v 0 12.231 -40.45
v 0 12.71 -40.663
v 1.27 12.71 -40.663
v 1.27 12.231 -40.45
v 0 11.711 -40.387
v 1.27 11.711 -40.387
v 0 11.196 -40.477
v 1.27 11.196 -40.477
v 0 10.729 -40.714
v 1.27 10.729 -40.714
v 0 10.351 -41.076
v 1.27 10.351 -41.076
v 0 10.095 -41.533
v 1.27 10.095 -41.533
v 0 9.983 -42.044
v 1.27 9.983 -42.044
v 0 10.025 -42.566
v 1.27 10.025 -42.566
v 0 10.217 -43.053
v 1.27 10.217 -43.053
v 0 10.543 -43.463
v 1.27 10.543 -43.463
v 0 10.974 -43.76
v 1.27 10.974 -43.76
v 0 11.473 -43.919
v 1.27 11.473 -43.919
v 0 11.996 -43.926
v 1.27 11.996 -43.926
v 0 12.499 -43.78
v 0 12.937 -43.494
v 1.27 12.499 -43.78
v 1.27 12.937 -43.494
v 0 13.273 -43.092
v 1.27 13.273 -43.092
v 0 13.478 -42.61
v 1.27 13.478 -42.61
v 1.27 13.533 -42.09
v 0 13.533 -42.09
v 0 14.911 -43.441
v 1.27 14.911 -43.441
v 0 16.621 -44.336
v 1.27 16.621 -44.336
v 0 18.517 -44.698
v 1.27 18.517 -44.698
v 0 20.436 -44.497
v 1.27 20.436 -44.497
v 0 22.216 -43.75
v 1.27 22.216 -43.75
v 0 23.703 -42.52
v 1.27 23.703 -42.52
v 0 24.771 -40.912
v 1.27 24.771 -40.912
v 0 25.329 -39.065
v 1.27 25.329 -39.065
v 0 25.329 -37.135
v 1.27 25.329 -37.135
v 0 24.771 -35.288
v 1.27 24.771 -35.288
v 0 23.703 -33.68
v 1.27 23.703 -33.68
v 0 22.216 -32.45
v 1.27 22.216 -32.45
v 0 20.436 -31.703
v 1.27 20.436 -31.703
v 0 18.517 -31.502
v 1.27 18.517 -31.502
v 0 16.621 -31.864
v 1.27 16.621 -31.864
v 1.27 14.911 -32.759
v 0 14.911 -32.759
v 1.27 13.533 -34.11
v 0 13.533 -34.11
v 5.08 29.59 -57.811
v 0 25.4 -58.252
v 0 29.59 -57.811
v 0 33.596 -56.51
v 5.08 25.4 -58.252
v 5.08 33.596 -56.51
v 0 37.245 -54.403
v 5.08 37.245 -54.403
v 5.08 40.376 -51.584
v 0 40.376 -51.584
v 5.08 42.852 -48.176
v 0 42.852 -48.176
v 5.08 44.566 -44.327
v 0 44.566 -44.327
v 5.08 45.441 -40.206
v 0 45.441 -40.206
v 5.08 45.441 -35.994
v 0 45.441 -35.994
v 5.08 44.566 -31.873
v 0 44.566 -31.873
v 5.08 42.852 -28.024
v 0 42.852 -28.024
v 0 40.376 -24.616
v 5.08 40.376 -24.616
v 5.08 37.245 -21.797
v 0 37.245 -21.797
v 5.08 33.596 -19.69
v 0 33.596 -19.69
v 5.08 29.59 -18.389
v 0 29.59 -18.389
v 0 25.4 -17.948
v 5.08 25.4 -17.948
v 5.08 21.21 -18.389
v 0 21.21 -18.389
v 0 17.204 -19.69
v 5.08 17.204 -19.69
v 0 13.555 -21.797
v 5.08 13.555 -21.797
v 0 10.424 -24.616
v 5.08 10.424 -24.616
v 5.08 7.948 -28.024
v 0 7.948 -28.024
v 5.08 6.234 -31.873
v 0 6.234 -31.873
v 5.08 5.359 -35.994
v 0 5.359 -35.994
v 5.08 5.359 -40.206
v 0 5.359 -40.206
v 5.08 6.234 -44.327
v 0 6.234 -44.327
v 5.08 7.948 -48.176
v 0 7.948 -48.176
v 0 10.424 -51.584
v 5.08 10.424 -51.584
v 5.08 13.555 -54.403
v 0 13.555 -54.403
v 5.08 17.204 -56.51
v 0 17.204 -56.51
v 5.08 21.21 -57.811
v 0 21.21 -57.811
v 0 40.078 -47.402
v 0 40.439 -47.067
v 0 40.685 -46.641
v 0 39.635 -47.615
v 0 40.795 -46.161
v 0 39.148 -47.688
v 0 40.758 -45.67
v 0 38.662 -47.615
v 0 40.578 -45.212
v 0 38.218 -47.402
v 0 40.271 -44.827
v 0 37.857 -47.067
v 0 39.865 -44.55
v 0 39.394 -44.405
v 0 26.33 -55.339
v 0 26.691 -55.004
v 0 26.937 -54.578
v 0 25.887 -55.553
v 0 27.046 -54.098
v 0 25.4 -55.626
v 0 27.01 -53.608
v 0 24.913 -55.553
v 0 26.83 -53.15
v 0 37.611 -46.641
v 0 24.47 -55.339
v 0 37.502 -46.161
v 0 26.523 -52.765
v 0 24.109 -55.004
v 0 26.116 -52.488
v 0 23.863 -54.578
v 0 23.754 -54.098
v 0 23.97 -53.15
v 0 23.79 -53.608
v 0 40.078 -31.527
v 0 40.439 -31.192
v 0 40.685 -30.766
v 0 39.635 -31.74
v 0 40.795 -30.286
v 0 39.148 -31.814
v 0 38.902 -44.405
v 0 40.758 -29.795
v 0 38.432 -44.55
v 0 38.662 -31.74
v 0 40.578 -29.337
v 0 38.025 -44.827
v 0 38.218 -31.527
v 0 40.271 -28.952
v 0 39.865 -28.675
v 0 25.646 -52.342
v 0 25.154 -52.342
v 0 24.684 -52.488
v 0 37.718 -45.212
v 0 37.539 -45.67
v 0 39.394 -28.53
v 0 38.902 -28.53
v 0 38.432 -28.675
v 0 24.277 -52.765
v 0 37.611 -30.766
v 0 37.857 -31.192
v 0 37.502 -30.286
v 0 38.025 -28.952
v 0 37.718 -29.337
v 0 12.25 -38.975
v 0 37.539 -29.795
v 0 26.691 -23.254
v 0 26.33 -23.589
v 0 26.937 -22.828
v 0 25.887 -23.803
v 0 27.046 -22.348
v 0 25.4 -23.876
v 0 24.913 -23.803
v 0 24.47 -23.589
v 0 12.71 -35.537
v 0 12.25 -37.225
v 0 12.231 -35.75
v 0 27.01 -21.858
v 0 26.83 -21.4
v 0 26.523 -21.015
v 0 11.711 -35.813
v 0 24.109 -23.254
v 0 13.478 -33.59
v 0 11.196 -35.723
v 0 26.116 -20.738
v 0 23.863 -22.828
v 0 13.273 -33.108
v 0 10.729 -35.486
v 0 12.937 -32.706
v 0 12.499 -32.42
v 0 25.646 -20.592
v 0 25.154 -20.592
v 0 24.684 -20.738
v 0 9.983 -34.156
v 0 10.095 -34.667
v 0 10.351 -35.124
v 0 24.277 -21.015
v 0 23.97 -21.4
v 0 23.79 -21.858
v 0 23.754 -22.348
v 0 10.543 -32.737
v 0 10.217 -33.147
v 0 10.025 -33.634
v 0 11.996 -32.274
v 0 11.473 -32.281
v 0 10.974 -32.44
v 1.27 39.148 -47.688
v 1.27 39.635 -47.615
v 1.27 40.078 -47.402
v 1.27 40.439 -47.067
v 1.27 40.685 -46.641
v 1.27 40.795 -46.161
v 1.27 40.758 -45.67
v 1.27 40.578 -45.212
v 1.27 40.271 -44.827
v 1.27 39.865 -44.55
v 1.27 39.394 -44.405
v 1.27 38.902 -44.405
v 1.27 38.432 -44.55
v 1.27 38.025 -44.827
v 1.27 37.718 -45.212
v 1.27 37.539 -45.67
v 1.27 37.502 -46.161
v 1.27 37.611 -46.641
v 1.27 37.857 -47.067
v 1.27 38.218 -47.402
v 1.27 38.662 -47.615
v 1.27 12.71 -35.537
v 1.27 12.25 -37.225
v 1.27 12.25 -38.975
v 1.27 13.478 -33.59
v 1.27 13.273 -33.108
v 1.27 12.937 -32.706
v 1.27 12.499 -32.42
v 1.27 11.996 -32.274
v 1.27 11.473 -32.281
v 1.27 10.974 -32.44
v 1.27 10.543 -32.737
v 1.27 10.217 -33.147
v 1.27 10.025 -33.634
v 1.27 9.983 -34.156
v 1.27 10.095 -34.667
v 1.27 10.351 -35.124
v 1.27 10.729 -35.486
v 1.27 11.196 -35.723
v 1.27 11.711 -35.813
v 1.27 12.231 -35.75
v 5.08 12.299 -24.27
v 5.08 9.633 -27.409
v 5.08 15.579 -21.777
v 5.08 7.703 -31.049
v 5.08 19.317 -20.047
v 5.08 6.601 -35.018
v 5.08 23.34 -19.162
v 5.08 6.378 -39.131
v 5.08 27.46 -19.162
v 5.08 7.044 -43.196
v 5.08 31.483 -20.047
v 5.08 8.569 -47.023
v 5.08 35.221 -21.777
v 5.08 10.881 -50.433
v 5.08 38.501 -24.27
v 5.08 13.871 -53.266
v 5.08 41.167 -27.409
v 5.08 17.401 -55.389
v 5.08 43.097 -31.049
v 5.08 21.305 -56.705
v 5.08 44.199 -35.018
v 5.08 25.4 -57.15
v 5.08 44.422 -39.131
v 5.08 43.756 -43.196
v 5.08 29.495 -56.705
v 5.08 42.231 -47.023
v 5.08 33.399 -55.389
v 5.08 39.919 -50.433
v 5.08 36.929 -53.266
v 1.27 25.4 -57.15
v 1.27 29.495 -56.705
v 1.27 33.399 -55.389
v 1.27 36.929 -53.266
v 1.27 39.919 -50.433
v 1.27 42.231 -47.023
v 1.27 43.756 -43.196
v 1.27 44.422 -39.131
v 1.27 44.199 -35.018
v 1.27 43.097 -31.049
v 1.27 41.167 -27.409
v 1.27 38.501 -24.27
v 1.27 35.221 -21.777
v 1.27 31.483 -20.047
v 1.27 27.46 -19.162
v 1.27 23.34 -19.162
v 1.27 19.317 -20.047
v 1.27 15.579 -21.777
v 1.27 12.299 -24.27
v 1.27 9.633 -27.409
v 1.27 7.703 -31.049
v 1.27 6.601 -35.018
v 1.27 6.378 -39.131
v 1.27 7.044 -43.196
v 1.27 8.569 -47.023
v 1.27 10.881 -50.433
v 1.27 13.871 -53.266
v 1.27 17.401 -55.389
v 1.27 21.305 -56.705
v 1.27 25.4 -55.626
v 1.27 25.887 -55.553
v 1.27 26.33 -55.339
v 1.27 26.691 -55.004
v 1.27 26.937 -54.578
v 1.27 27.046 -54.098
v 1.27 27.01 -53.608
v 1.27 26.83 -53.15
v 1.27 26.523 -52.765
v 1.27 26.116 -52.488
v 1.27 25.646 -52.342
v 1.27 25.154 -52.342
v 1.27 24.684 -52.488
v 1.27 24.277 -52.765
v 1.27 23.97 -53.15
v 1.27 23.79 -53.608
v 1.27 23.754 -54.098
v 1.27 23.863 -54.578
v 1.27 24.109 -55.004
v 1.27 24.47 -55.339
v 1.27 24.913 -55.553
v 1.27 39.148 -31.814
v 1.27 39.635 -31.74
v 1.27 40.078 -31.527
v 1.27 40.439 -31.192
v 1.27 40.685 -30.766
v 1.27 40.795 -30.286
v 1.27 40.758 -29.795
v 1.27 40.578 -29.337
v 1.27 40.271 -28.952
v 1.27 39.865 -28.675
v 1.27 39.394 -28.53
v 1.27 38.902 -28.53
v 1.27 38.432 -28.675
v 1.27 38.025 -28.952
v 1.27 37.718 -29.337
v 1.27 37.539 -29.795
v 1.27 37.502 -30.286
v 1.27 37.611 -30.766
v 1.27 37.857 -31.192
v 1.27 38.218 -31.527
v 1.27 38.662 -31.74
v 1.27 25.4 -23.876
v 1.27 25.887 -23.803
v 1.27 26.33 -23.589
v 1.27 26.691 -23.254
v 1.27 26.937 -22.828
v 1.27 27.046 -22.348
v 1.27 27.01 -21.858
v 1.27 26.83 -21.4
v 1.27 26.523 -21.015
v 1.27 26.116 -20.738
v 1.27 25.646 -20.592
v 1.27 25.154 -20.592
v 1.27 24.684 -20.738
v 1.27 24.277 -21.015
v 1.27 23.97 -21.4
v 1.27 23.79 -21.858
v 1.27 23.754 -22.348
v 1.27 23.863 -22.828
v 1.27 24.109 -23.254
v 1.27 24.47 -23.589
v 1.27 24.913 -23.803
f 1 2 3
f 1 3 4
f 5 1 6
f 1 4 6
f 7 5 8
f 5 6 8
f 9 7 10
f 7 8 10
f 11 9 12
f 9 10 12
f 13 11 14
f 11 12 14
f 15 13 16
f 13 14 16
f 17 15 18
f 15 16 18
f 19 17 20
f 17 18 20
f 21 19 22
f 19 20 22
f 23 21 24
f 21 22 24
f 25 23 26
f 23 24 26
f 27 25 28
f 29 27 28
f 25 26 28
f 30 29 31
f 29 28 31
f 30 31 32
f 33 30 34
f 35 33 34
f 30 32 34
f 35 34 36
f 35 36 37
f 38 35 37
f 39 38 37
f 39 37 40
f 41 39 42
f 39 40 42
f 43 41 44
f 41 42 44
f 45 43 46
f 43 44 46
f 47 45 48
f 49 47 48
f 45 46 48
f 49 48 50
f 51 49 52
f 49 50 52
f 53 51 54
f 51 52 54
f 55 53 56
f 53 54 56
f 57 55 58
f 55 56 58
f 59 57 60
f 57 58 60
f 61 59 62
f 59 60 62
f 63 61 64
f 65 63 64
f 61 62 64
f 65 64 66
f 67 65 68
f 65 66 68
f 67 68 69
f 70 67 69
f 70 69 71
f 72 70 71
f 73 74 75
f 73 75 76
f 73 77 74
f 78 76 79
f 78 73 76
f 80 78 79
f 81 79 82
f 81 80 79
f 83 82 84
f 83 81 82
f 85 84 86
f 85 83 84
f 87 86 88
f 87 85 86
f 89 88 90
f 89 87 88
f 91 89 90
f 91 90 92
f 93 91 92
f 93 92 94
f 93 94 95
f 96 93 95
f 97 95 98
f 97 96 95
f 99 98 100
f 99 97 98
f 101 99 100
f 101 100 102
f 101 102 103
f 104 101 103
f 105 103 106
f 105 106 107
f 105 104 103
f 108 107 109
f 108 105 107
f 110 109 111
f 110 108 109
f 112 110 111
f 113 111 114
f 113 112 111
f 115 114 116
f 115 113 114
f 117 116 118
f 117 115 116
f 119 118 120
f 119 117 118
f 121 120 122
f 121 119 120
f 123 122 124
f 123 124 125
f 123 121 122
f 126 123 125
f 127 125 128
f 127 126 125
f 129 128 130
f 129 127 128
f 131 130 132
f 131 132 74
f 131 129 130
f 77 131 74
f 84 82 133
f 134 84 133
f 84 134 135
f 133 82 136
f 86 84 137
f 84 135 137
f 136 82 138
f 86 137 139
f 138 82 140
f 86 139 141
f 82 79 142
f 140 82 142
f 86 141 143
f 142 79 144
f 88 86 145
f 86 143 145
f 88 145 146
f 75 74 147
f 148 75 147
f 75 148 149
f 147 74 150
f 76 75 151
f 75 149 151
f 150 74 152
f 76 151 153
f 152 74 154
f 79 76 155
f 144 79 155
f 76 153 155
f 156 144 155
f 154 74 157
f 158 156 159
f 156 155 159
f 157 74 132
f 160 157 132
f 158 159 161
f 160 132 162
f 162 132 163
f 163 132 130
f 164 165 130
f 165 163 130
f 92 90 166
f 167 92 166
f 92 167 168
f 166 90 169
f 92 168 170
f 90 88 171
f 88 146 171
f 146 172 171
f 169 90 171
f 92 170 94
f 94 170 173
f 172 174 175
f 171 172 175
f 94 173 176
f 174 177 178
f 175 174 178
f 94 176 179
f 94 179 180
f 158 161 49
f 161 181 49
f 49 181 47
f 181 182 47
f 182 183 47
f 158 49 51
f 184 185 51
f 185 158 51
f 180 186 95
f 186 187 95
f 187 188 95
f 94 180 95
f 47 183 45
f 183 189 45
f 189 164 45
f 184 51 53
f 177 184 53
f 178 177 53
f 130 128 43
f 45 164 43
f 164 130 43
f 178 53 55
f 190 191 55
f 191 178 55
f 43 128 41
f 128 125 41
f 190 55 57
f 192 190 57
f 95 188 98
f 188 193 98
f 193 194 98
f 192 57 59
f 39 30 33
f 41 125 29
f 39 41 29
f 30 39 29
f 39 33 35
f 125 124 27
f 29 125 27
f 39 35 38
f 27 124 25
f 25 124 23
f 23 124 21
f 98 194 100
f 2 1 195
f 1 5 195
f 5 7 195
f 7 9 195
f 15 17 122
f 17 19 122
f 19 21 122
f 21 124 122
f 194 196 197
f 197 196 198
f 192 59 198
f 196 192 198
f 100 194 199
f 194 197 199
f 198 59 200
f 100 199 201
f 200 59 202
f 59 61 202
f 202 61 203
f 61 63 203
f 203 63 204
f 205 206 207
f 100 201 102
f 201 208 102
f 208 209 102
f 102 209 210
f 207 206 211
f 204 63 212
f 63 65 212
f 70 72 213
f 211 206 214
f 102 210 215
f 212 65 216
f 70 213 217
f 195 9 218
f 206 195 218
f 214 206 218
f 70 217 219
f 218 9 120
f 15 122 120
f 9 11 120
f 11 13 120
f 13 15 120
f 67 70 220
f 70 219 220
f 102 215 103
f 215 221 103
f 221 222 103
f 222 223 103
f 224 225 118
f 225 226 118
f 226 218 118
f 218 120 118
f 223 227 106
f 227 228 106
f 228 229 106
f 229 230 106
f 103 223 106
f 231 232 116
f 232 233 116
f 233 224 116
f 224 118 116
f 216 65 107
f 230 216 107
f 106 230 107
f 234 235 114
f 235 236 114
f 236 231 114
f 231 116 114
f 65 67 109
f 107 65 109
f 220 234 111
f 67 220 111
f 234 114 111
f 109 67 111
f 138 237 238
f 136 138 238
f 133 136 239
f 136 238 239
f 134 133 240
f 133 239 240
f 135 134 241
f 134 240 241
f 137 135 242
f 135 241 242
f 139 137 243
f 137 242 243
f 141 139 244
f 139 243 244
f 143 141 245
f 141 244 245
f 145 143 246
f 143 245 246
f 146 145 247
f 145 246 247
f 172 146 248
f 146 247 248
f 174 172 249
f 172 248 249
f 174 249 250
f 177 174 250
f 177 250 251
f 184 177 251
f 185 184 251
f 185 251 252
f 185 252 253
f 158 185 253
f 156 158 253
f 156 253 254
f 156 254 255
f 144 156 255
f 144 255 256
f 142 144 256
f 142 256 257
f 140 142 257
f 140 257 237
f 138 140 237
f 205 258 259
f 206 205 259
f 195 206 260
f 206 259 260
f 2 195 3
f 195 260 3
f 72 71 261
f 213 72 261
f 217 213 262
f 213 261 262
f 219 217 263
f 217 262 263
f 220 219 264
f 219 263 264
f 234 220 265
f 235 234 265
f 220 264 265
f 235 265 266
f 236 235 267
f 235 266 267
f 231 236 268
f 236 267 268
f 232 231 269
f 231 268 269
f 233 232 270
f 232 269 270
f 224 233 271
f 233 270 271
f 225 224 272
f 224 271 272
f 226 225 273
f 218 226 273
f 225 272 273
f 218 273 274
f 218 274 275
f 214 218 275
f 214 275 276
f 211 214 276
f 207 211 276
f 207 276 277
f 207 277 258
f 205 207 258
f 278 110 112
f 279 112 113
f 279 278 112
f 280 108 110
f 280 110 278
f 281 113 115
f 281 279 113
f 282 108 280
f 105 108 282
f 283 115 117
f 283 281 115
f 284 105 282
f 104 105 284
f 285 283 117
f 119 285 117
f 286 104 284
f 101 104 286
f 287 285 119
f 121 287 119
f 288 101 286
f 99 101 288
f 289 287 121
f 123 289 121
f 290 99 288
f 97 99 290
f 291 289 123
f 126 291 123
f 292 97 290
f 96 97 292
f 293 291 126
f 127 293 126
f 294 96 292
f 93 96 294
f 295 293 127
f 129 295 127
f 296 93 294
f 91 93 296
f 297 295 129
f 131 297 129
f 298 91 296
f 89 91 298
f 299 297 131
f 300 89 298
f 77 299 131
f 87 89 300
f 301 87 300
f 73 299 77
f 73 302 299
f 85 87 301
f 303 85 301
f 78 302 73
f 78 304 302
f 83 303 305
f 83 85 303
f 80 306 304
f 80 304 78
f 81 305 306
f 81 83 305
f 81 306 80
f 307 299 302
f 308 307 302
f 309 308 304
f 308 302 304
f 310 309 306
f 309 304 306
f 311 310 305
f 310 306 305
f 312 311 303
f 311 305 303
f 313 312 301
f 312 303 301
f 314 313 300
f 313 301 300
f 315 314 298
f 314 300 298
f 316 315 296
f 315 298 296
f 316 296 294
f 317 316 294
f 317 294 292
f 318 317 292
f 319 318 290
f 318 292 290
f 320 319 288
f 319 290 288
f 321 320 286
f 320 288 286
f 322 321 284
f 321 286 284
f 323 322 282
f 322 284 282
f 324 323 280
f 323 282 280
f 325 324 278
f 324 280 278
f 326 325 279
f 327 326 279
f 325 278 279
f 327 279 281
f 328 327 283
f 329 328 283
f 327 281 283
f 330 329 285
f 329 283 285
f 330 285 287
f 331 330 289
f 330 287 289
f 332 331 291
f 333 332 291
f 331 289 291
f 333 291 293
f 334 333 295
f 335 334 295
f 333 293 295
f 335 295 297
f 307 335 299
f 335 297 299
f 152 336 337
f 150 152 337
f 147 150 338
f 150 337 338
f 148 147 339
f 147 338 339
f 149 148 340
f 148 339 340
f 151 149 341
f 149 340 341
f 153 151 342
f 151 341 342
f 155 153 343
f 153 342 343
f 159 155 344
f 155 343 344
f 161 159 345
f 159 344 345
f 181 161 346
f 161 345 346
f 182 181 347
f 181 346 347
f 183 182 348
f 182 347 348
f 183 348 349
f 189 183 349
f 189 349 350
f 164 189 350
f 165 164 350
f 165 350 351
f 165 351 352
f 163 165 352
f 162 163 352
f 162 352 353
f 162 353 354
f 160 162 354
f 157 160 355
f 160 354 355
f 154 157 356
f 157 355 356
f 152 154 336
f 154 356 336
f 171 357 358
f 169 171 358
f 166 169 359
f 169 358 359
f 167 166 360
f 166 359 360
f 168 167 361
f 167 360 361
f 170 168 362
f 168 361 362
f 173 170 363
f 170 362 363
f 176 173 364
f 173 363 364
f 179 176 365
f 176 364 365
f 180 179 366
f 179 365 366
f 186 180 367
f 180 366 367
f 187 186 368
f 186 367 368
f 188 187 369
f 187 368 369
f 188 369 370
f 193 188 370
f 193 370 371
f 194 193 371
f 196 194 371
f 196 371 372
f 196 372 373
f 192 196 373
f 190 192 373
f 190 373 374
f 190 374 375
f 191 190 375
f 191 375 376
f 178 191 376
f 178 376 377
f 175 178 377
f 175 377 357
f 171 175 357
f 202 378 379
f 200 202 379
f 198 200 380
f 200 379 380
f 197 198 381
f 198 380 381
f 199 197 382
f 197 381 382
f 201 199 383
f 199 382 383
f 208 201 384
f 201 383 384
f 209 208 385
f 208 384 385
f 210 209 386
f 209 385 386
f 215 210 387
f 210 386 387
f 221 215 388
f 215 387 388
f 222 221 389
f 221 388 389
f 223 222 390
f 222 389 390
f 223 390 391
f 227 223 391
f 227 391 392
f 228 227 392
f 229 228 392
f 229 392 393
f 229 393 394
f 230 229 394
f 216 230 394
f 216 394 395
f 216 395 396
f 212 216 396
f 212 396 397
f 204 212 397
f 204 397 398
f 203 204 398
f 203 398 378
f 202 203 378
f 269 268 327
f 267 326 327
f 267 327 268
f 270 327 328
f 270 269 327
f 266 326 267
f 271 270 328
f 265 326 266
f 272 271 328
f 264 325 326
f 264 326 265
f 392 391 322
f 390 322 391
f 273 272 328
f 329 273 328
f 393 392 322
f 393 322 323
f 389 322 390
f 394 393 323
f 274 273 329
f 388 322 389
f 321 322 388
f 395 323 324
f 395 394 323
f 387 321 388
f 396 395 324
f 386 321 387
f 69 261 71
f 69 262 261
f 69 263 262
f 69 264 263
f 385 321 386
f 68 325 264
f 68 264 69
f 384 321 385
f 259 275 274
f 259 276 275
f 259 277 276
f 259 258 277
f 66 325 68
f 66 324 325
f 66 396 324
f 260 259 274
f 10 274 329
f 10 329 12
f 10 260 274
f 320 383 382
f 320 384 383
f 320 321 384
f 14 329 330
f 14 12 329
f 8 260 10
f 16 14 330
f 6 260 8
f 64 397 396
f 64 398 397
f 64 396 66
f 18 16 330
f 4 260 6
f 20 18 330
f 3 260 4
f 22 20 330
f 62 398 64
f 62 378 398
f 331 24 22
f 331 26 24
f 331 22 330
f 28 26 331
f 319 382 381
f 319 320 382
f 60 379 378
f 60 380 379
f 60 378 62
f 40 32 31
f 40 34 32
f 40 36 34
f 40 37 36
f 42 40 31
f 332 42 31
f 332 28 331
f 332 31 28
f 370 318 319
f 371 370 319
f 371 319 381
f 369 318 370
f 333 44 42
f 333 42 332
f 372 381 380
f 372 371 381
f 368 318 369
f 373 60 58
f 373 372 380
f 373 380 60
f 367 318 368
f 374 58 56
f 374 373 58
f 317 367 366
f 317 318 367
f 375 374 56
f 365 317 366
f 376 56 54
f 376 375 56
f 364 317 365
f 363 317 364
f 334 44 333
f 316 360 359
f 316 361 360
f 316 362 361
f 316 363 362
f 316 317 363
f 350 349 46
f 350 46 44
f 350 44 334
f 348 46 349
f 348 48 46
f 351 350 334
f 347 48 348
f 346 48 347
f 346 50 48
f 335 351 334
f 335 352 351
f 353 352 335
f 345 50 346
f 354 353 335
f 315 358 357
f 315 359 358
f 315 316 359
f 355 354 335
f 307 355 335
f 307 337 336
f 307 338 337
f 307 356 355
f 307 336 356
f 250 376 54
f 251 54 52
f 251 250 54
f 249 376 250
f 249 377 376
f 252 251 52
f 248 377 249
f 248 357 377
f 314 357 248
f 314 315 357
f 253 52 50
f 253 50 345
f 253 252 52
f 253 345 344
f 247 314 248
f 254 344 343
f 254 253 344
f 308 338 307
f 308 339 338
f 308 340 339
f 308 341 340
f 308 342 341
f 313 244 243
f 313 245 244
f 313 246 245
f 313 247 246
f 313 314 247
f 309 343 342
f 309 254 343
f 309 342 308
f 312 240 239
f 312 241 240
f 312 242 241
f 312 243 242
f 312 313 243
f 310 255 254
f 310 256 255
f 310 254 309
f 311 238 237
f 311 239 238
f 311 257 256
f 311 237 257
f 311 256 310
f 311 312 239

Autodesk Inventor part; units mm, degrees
ref_plane "YZ Plane" through (0, 0, 0) normal (1, 0, 0) x (0, 1, 0)
ref_plane "XZ Plane" through (0, 0, 0) normal (0, 1, 0) x (-1, 0, 0)
ref_plane "XY Plane" through (0, 0, 0) normal (0, 0, 1) x (1, 0, 0)
sketch "Sketch1" plane through (0, 0, 0) normal (0, 1, 0) x (-1, 0, 0)
  line L0 (0, 0) -> (-20.32, 0)
  line L1 (-20.32, 0) -> (-20.32, -76.2)
  line L2 (-20.32, -76.2) -> (0, -76.2)
  line L3 (0, -76.2) -> (0, 0)
  dimension "d0" = 20.32
  dimension "d1" = 76.2
extrude "Extrusion1" add sketch "Sketch1" along normal blind 7.62
sketch "Sketch2" plane through (0, 7.62, 0) normal (0, 1, 0) x (1, 0, 0)
  line L0 (0, 0) -> (0, 12.7)
  line L1 (0, 12.7) -> (20.32, 12.7)
  line L2 (20.32, 12.7) -> (20.32, 63.5)
  line L3 (20.32, 63.5) -> (0, 63.5)
  line L4 (0, 63.5) -> (0, 12.7)
  dimension "d4" = 12.7
  dimension "d5" = 20.32
  dimension "d6" = 50.8
extrude "Extrusion2" add sketch "Sketch2" along normal blind 43.18
sketch "Sketch3" plane through (20.32, 0, 0) normal (1, 0, 0) x (0, 0, -1)
  line L0 (12.7, 50.8) -> (63.5, 50.8) projected
  line L1 (38.1, 50.8) -> (38.1, 25.4)
  circle A0 centre (38.1, 25.4) radius 19.05
  point P0 (0, 0)
  dimension "d9" = 25.4
  dimension "d10" = 38.1
extrude "Extrusion3" cut sketch "Sketch3" against normal blind 15.24
fillet "Fillet1" radius 25.4 2 edges at (10.16, 50.8, -63.5) (10.16, 50.8, -12.7)
sketch "Sketch6" plane through (0, 7.62, 0) normal (0, 1, 0) x (1, 0, 0)
  line L0 (0, 0) -> (20.32, 0) projected
  line L1 (10.16, 0) -> (10.16, 6.35)
  line L2 (20.32, 76.2) -> (0, 76.2) projected
  line L3 (10.16, 76.2) -> (10.16, 69.85)
  dimension "d20" = 6.35
  dimension "d21" = 6.35
fillet "Fillet2" radius 25.4 2 edges at (10.16, 7.62, -63.5) (10.16, 7.62, -12.7)
hole "Hole1" at (10.16, 7.62, -6.35) at (10.16, 7.62, -69.85) direction (0, -1, 0) diameter 5.08 end through all counterbore diameter 10.16 counterbore depth 3.81
sketch "Sketch7" plane through (10.16, 7.62, -6.35) normal (0, -1, 0) x (1, 0, 0)
  circle A0 centre (0, 0) radius 5.08
  circle A1 centre (0, -63.5) radius 2.54 projected
  line L0 (-2.54, -63.5) -> (0, -63.5)
  circle A2 centre (0, -63.5) radius 5.08
  point P0 (-10.16, 6.35)
  dimension "d30" = 10.16
  dimension "d31" = 10.16
extrude "Extrusion5" cut sketch "Sketch7" against normal blind 15.24 contours A0 | A1 | A2
sketch "Sketch9" plane through (5.08, 25.4, -38.1) normal (1, 0, 0) x (0, 0, -1)
  line L0 (0, 0) -> (0, -6.604)
  circle A0 centre (0, -6.604) radius 6.604
  line L1 (0, -6.604) -> (-3.302, -12.3232)
  line L2 (0, -6.604) -> (6.604, -6.604) construction
  line L3 (0, -6.604) -> (3.302, -12.3232)
  line L4 (0, -6.604) -> (6.604, -6.604) construction
  line L5 (-3.302, -12.3232) -> (-4.064, -13.6431)
  line L6 (3.302, -12.3232) -> (4.064, -13.6431)
  line L7 (3.302, -12.3232) -> (4.826, -12.3232) construction
  circle A1 centre (-4.064, -13.6431) radius 1.778
  circle A2 centre (4.064, -13.6431) radius 1.778
  circle A3 centre (0, 0) radius 19.05 projected
  line L8 (-19.05, 0) -> (-17.526, 0)
  line L9 (-17.526, 0) -> (-15.875, 0)
  circle A4 centre (-15.875, 0) radius 1.651
  line L10 (19.05, 0) -> (17.526, 0)
  line L11 (17.526, 0) -> (15.875, 0)
  circle A5 centre (15.875, 0) radius 1.651
  line L12 (0, 0) -> (-9.525, 16.4978)
  line L13 (0, 0) -> (9.525, 16.4978)
  line L14 (-9.525, 16.4978) -> (-8.763, 15.178)
  line L15 (-8.763, 15.178) -> (-7.9375, 13.7482)
  line L16 (9.525, 16.4978) -> (8.763, 15.178)
  line L17 (8.763, 15.178) -> (7.9375, 13.7482)
  circle A6 centre (-7.9375, 13.7482) radius 1.651
  circle A7 centre (7.9375, 13.7482) radius 1.651
  point P0 (-38.1, -25.4)
  point P1 (-2.5627, -12.6905)
  point P2 (2.5627, -12.6905)
  point P3 (3.9897, -11.8666)
  point P4 (-3.9897, -11.8666)
  dimension "d47" = 6.604
  dimension "d48" = 120
  dimension "d49" = 60
  dimension "d50" = 1.524
  dimension "d51" = 1.524
  dimension "d52" = 60
  dimension "d53" = 3.556
  dimension "d54" = 3.556
  dimension "d55" = 1.524
  dimension "d56" = 1.651
  dimension "d57" = 1.524
  dimension "d58" = 1.651
  dimension "d59" = 1.524
  dimension "d60" = 1.651
  dimension "d61" = 1.524
  dimension "d62" = 1.651
extrude "Extrusion7" cut sketch "Sketch9" against normal blind 25.4 contours A0 A2 L3 L0 | L0 L1 A1 A0 | L3 A2 A0 A1 L1 | A1 L1 A0 | A0 A1 | A6 L12 | L12 A6 | A7 L13 | L13 A7 | A1 A0 L1 | A2 A0 L3 | L3 A0 A2 | A2 A0 | A4 | A5
sketch "Sketch10" plane through (5.08, 25.4, -38.1) normal (1, 0, 0) x (0, 0, -1)
  arc A0 (3.9897, -11.8666) -> (-3.9897, -11.8666) centre (0, -6.604) ccw projected
  circle A1 centre (0, 0) radius 20.1518
  circle A2 centre (0, 0) radius 57.3764
  point P0 (-38.1, -25.4)
extrude "Extrusion8" cut sketch "Sketch10" along normal mid plane 50.8
sketch "Sketch11" plane through (5.08, 25.4, -38.1) normal (1, 0, 0) x (0, 0, -1)
  arc A0 (3.9897, -11.8666) -> (-3.9897, -11.8666) centre (0, -6.604) ccw projected
  circle A1 centre (0, 0) radius 19.05
  point P0 (-38.1, -25.4)
extrude "Extrusion9" cut sketch "Sketch11" against normal blind 3.81
sketch "Sketch12" plane through (20.32, 25.4, -38.1) normal (1, 0, 0) x (0, 0, -1)
  arc A0 (3.9897, -11.8666) -> (-3.9897, -11.8666) centre (0, -6.604) ccw projected
  circle A1 centre (0, 0) radius 21.629
  point P0 (-38.1, -25.4)
extrude "Extrusion10" cut sketch "Sketch12" against normal blind 15.24
properties part number "Motor Mount V2"
